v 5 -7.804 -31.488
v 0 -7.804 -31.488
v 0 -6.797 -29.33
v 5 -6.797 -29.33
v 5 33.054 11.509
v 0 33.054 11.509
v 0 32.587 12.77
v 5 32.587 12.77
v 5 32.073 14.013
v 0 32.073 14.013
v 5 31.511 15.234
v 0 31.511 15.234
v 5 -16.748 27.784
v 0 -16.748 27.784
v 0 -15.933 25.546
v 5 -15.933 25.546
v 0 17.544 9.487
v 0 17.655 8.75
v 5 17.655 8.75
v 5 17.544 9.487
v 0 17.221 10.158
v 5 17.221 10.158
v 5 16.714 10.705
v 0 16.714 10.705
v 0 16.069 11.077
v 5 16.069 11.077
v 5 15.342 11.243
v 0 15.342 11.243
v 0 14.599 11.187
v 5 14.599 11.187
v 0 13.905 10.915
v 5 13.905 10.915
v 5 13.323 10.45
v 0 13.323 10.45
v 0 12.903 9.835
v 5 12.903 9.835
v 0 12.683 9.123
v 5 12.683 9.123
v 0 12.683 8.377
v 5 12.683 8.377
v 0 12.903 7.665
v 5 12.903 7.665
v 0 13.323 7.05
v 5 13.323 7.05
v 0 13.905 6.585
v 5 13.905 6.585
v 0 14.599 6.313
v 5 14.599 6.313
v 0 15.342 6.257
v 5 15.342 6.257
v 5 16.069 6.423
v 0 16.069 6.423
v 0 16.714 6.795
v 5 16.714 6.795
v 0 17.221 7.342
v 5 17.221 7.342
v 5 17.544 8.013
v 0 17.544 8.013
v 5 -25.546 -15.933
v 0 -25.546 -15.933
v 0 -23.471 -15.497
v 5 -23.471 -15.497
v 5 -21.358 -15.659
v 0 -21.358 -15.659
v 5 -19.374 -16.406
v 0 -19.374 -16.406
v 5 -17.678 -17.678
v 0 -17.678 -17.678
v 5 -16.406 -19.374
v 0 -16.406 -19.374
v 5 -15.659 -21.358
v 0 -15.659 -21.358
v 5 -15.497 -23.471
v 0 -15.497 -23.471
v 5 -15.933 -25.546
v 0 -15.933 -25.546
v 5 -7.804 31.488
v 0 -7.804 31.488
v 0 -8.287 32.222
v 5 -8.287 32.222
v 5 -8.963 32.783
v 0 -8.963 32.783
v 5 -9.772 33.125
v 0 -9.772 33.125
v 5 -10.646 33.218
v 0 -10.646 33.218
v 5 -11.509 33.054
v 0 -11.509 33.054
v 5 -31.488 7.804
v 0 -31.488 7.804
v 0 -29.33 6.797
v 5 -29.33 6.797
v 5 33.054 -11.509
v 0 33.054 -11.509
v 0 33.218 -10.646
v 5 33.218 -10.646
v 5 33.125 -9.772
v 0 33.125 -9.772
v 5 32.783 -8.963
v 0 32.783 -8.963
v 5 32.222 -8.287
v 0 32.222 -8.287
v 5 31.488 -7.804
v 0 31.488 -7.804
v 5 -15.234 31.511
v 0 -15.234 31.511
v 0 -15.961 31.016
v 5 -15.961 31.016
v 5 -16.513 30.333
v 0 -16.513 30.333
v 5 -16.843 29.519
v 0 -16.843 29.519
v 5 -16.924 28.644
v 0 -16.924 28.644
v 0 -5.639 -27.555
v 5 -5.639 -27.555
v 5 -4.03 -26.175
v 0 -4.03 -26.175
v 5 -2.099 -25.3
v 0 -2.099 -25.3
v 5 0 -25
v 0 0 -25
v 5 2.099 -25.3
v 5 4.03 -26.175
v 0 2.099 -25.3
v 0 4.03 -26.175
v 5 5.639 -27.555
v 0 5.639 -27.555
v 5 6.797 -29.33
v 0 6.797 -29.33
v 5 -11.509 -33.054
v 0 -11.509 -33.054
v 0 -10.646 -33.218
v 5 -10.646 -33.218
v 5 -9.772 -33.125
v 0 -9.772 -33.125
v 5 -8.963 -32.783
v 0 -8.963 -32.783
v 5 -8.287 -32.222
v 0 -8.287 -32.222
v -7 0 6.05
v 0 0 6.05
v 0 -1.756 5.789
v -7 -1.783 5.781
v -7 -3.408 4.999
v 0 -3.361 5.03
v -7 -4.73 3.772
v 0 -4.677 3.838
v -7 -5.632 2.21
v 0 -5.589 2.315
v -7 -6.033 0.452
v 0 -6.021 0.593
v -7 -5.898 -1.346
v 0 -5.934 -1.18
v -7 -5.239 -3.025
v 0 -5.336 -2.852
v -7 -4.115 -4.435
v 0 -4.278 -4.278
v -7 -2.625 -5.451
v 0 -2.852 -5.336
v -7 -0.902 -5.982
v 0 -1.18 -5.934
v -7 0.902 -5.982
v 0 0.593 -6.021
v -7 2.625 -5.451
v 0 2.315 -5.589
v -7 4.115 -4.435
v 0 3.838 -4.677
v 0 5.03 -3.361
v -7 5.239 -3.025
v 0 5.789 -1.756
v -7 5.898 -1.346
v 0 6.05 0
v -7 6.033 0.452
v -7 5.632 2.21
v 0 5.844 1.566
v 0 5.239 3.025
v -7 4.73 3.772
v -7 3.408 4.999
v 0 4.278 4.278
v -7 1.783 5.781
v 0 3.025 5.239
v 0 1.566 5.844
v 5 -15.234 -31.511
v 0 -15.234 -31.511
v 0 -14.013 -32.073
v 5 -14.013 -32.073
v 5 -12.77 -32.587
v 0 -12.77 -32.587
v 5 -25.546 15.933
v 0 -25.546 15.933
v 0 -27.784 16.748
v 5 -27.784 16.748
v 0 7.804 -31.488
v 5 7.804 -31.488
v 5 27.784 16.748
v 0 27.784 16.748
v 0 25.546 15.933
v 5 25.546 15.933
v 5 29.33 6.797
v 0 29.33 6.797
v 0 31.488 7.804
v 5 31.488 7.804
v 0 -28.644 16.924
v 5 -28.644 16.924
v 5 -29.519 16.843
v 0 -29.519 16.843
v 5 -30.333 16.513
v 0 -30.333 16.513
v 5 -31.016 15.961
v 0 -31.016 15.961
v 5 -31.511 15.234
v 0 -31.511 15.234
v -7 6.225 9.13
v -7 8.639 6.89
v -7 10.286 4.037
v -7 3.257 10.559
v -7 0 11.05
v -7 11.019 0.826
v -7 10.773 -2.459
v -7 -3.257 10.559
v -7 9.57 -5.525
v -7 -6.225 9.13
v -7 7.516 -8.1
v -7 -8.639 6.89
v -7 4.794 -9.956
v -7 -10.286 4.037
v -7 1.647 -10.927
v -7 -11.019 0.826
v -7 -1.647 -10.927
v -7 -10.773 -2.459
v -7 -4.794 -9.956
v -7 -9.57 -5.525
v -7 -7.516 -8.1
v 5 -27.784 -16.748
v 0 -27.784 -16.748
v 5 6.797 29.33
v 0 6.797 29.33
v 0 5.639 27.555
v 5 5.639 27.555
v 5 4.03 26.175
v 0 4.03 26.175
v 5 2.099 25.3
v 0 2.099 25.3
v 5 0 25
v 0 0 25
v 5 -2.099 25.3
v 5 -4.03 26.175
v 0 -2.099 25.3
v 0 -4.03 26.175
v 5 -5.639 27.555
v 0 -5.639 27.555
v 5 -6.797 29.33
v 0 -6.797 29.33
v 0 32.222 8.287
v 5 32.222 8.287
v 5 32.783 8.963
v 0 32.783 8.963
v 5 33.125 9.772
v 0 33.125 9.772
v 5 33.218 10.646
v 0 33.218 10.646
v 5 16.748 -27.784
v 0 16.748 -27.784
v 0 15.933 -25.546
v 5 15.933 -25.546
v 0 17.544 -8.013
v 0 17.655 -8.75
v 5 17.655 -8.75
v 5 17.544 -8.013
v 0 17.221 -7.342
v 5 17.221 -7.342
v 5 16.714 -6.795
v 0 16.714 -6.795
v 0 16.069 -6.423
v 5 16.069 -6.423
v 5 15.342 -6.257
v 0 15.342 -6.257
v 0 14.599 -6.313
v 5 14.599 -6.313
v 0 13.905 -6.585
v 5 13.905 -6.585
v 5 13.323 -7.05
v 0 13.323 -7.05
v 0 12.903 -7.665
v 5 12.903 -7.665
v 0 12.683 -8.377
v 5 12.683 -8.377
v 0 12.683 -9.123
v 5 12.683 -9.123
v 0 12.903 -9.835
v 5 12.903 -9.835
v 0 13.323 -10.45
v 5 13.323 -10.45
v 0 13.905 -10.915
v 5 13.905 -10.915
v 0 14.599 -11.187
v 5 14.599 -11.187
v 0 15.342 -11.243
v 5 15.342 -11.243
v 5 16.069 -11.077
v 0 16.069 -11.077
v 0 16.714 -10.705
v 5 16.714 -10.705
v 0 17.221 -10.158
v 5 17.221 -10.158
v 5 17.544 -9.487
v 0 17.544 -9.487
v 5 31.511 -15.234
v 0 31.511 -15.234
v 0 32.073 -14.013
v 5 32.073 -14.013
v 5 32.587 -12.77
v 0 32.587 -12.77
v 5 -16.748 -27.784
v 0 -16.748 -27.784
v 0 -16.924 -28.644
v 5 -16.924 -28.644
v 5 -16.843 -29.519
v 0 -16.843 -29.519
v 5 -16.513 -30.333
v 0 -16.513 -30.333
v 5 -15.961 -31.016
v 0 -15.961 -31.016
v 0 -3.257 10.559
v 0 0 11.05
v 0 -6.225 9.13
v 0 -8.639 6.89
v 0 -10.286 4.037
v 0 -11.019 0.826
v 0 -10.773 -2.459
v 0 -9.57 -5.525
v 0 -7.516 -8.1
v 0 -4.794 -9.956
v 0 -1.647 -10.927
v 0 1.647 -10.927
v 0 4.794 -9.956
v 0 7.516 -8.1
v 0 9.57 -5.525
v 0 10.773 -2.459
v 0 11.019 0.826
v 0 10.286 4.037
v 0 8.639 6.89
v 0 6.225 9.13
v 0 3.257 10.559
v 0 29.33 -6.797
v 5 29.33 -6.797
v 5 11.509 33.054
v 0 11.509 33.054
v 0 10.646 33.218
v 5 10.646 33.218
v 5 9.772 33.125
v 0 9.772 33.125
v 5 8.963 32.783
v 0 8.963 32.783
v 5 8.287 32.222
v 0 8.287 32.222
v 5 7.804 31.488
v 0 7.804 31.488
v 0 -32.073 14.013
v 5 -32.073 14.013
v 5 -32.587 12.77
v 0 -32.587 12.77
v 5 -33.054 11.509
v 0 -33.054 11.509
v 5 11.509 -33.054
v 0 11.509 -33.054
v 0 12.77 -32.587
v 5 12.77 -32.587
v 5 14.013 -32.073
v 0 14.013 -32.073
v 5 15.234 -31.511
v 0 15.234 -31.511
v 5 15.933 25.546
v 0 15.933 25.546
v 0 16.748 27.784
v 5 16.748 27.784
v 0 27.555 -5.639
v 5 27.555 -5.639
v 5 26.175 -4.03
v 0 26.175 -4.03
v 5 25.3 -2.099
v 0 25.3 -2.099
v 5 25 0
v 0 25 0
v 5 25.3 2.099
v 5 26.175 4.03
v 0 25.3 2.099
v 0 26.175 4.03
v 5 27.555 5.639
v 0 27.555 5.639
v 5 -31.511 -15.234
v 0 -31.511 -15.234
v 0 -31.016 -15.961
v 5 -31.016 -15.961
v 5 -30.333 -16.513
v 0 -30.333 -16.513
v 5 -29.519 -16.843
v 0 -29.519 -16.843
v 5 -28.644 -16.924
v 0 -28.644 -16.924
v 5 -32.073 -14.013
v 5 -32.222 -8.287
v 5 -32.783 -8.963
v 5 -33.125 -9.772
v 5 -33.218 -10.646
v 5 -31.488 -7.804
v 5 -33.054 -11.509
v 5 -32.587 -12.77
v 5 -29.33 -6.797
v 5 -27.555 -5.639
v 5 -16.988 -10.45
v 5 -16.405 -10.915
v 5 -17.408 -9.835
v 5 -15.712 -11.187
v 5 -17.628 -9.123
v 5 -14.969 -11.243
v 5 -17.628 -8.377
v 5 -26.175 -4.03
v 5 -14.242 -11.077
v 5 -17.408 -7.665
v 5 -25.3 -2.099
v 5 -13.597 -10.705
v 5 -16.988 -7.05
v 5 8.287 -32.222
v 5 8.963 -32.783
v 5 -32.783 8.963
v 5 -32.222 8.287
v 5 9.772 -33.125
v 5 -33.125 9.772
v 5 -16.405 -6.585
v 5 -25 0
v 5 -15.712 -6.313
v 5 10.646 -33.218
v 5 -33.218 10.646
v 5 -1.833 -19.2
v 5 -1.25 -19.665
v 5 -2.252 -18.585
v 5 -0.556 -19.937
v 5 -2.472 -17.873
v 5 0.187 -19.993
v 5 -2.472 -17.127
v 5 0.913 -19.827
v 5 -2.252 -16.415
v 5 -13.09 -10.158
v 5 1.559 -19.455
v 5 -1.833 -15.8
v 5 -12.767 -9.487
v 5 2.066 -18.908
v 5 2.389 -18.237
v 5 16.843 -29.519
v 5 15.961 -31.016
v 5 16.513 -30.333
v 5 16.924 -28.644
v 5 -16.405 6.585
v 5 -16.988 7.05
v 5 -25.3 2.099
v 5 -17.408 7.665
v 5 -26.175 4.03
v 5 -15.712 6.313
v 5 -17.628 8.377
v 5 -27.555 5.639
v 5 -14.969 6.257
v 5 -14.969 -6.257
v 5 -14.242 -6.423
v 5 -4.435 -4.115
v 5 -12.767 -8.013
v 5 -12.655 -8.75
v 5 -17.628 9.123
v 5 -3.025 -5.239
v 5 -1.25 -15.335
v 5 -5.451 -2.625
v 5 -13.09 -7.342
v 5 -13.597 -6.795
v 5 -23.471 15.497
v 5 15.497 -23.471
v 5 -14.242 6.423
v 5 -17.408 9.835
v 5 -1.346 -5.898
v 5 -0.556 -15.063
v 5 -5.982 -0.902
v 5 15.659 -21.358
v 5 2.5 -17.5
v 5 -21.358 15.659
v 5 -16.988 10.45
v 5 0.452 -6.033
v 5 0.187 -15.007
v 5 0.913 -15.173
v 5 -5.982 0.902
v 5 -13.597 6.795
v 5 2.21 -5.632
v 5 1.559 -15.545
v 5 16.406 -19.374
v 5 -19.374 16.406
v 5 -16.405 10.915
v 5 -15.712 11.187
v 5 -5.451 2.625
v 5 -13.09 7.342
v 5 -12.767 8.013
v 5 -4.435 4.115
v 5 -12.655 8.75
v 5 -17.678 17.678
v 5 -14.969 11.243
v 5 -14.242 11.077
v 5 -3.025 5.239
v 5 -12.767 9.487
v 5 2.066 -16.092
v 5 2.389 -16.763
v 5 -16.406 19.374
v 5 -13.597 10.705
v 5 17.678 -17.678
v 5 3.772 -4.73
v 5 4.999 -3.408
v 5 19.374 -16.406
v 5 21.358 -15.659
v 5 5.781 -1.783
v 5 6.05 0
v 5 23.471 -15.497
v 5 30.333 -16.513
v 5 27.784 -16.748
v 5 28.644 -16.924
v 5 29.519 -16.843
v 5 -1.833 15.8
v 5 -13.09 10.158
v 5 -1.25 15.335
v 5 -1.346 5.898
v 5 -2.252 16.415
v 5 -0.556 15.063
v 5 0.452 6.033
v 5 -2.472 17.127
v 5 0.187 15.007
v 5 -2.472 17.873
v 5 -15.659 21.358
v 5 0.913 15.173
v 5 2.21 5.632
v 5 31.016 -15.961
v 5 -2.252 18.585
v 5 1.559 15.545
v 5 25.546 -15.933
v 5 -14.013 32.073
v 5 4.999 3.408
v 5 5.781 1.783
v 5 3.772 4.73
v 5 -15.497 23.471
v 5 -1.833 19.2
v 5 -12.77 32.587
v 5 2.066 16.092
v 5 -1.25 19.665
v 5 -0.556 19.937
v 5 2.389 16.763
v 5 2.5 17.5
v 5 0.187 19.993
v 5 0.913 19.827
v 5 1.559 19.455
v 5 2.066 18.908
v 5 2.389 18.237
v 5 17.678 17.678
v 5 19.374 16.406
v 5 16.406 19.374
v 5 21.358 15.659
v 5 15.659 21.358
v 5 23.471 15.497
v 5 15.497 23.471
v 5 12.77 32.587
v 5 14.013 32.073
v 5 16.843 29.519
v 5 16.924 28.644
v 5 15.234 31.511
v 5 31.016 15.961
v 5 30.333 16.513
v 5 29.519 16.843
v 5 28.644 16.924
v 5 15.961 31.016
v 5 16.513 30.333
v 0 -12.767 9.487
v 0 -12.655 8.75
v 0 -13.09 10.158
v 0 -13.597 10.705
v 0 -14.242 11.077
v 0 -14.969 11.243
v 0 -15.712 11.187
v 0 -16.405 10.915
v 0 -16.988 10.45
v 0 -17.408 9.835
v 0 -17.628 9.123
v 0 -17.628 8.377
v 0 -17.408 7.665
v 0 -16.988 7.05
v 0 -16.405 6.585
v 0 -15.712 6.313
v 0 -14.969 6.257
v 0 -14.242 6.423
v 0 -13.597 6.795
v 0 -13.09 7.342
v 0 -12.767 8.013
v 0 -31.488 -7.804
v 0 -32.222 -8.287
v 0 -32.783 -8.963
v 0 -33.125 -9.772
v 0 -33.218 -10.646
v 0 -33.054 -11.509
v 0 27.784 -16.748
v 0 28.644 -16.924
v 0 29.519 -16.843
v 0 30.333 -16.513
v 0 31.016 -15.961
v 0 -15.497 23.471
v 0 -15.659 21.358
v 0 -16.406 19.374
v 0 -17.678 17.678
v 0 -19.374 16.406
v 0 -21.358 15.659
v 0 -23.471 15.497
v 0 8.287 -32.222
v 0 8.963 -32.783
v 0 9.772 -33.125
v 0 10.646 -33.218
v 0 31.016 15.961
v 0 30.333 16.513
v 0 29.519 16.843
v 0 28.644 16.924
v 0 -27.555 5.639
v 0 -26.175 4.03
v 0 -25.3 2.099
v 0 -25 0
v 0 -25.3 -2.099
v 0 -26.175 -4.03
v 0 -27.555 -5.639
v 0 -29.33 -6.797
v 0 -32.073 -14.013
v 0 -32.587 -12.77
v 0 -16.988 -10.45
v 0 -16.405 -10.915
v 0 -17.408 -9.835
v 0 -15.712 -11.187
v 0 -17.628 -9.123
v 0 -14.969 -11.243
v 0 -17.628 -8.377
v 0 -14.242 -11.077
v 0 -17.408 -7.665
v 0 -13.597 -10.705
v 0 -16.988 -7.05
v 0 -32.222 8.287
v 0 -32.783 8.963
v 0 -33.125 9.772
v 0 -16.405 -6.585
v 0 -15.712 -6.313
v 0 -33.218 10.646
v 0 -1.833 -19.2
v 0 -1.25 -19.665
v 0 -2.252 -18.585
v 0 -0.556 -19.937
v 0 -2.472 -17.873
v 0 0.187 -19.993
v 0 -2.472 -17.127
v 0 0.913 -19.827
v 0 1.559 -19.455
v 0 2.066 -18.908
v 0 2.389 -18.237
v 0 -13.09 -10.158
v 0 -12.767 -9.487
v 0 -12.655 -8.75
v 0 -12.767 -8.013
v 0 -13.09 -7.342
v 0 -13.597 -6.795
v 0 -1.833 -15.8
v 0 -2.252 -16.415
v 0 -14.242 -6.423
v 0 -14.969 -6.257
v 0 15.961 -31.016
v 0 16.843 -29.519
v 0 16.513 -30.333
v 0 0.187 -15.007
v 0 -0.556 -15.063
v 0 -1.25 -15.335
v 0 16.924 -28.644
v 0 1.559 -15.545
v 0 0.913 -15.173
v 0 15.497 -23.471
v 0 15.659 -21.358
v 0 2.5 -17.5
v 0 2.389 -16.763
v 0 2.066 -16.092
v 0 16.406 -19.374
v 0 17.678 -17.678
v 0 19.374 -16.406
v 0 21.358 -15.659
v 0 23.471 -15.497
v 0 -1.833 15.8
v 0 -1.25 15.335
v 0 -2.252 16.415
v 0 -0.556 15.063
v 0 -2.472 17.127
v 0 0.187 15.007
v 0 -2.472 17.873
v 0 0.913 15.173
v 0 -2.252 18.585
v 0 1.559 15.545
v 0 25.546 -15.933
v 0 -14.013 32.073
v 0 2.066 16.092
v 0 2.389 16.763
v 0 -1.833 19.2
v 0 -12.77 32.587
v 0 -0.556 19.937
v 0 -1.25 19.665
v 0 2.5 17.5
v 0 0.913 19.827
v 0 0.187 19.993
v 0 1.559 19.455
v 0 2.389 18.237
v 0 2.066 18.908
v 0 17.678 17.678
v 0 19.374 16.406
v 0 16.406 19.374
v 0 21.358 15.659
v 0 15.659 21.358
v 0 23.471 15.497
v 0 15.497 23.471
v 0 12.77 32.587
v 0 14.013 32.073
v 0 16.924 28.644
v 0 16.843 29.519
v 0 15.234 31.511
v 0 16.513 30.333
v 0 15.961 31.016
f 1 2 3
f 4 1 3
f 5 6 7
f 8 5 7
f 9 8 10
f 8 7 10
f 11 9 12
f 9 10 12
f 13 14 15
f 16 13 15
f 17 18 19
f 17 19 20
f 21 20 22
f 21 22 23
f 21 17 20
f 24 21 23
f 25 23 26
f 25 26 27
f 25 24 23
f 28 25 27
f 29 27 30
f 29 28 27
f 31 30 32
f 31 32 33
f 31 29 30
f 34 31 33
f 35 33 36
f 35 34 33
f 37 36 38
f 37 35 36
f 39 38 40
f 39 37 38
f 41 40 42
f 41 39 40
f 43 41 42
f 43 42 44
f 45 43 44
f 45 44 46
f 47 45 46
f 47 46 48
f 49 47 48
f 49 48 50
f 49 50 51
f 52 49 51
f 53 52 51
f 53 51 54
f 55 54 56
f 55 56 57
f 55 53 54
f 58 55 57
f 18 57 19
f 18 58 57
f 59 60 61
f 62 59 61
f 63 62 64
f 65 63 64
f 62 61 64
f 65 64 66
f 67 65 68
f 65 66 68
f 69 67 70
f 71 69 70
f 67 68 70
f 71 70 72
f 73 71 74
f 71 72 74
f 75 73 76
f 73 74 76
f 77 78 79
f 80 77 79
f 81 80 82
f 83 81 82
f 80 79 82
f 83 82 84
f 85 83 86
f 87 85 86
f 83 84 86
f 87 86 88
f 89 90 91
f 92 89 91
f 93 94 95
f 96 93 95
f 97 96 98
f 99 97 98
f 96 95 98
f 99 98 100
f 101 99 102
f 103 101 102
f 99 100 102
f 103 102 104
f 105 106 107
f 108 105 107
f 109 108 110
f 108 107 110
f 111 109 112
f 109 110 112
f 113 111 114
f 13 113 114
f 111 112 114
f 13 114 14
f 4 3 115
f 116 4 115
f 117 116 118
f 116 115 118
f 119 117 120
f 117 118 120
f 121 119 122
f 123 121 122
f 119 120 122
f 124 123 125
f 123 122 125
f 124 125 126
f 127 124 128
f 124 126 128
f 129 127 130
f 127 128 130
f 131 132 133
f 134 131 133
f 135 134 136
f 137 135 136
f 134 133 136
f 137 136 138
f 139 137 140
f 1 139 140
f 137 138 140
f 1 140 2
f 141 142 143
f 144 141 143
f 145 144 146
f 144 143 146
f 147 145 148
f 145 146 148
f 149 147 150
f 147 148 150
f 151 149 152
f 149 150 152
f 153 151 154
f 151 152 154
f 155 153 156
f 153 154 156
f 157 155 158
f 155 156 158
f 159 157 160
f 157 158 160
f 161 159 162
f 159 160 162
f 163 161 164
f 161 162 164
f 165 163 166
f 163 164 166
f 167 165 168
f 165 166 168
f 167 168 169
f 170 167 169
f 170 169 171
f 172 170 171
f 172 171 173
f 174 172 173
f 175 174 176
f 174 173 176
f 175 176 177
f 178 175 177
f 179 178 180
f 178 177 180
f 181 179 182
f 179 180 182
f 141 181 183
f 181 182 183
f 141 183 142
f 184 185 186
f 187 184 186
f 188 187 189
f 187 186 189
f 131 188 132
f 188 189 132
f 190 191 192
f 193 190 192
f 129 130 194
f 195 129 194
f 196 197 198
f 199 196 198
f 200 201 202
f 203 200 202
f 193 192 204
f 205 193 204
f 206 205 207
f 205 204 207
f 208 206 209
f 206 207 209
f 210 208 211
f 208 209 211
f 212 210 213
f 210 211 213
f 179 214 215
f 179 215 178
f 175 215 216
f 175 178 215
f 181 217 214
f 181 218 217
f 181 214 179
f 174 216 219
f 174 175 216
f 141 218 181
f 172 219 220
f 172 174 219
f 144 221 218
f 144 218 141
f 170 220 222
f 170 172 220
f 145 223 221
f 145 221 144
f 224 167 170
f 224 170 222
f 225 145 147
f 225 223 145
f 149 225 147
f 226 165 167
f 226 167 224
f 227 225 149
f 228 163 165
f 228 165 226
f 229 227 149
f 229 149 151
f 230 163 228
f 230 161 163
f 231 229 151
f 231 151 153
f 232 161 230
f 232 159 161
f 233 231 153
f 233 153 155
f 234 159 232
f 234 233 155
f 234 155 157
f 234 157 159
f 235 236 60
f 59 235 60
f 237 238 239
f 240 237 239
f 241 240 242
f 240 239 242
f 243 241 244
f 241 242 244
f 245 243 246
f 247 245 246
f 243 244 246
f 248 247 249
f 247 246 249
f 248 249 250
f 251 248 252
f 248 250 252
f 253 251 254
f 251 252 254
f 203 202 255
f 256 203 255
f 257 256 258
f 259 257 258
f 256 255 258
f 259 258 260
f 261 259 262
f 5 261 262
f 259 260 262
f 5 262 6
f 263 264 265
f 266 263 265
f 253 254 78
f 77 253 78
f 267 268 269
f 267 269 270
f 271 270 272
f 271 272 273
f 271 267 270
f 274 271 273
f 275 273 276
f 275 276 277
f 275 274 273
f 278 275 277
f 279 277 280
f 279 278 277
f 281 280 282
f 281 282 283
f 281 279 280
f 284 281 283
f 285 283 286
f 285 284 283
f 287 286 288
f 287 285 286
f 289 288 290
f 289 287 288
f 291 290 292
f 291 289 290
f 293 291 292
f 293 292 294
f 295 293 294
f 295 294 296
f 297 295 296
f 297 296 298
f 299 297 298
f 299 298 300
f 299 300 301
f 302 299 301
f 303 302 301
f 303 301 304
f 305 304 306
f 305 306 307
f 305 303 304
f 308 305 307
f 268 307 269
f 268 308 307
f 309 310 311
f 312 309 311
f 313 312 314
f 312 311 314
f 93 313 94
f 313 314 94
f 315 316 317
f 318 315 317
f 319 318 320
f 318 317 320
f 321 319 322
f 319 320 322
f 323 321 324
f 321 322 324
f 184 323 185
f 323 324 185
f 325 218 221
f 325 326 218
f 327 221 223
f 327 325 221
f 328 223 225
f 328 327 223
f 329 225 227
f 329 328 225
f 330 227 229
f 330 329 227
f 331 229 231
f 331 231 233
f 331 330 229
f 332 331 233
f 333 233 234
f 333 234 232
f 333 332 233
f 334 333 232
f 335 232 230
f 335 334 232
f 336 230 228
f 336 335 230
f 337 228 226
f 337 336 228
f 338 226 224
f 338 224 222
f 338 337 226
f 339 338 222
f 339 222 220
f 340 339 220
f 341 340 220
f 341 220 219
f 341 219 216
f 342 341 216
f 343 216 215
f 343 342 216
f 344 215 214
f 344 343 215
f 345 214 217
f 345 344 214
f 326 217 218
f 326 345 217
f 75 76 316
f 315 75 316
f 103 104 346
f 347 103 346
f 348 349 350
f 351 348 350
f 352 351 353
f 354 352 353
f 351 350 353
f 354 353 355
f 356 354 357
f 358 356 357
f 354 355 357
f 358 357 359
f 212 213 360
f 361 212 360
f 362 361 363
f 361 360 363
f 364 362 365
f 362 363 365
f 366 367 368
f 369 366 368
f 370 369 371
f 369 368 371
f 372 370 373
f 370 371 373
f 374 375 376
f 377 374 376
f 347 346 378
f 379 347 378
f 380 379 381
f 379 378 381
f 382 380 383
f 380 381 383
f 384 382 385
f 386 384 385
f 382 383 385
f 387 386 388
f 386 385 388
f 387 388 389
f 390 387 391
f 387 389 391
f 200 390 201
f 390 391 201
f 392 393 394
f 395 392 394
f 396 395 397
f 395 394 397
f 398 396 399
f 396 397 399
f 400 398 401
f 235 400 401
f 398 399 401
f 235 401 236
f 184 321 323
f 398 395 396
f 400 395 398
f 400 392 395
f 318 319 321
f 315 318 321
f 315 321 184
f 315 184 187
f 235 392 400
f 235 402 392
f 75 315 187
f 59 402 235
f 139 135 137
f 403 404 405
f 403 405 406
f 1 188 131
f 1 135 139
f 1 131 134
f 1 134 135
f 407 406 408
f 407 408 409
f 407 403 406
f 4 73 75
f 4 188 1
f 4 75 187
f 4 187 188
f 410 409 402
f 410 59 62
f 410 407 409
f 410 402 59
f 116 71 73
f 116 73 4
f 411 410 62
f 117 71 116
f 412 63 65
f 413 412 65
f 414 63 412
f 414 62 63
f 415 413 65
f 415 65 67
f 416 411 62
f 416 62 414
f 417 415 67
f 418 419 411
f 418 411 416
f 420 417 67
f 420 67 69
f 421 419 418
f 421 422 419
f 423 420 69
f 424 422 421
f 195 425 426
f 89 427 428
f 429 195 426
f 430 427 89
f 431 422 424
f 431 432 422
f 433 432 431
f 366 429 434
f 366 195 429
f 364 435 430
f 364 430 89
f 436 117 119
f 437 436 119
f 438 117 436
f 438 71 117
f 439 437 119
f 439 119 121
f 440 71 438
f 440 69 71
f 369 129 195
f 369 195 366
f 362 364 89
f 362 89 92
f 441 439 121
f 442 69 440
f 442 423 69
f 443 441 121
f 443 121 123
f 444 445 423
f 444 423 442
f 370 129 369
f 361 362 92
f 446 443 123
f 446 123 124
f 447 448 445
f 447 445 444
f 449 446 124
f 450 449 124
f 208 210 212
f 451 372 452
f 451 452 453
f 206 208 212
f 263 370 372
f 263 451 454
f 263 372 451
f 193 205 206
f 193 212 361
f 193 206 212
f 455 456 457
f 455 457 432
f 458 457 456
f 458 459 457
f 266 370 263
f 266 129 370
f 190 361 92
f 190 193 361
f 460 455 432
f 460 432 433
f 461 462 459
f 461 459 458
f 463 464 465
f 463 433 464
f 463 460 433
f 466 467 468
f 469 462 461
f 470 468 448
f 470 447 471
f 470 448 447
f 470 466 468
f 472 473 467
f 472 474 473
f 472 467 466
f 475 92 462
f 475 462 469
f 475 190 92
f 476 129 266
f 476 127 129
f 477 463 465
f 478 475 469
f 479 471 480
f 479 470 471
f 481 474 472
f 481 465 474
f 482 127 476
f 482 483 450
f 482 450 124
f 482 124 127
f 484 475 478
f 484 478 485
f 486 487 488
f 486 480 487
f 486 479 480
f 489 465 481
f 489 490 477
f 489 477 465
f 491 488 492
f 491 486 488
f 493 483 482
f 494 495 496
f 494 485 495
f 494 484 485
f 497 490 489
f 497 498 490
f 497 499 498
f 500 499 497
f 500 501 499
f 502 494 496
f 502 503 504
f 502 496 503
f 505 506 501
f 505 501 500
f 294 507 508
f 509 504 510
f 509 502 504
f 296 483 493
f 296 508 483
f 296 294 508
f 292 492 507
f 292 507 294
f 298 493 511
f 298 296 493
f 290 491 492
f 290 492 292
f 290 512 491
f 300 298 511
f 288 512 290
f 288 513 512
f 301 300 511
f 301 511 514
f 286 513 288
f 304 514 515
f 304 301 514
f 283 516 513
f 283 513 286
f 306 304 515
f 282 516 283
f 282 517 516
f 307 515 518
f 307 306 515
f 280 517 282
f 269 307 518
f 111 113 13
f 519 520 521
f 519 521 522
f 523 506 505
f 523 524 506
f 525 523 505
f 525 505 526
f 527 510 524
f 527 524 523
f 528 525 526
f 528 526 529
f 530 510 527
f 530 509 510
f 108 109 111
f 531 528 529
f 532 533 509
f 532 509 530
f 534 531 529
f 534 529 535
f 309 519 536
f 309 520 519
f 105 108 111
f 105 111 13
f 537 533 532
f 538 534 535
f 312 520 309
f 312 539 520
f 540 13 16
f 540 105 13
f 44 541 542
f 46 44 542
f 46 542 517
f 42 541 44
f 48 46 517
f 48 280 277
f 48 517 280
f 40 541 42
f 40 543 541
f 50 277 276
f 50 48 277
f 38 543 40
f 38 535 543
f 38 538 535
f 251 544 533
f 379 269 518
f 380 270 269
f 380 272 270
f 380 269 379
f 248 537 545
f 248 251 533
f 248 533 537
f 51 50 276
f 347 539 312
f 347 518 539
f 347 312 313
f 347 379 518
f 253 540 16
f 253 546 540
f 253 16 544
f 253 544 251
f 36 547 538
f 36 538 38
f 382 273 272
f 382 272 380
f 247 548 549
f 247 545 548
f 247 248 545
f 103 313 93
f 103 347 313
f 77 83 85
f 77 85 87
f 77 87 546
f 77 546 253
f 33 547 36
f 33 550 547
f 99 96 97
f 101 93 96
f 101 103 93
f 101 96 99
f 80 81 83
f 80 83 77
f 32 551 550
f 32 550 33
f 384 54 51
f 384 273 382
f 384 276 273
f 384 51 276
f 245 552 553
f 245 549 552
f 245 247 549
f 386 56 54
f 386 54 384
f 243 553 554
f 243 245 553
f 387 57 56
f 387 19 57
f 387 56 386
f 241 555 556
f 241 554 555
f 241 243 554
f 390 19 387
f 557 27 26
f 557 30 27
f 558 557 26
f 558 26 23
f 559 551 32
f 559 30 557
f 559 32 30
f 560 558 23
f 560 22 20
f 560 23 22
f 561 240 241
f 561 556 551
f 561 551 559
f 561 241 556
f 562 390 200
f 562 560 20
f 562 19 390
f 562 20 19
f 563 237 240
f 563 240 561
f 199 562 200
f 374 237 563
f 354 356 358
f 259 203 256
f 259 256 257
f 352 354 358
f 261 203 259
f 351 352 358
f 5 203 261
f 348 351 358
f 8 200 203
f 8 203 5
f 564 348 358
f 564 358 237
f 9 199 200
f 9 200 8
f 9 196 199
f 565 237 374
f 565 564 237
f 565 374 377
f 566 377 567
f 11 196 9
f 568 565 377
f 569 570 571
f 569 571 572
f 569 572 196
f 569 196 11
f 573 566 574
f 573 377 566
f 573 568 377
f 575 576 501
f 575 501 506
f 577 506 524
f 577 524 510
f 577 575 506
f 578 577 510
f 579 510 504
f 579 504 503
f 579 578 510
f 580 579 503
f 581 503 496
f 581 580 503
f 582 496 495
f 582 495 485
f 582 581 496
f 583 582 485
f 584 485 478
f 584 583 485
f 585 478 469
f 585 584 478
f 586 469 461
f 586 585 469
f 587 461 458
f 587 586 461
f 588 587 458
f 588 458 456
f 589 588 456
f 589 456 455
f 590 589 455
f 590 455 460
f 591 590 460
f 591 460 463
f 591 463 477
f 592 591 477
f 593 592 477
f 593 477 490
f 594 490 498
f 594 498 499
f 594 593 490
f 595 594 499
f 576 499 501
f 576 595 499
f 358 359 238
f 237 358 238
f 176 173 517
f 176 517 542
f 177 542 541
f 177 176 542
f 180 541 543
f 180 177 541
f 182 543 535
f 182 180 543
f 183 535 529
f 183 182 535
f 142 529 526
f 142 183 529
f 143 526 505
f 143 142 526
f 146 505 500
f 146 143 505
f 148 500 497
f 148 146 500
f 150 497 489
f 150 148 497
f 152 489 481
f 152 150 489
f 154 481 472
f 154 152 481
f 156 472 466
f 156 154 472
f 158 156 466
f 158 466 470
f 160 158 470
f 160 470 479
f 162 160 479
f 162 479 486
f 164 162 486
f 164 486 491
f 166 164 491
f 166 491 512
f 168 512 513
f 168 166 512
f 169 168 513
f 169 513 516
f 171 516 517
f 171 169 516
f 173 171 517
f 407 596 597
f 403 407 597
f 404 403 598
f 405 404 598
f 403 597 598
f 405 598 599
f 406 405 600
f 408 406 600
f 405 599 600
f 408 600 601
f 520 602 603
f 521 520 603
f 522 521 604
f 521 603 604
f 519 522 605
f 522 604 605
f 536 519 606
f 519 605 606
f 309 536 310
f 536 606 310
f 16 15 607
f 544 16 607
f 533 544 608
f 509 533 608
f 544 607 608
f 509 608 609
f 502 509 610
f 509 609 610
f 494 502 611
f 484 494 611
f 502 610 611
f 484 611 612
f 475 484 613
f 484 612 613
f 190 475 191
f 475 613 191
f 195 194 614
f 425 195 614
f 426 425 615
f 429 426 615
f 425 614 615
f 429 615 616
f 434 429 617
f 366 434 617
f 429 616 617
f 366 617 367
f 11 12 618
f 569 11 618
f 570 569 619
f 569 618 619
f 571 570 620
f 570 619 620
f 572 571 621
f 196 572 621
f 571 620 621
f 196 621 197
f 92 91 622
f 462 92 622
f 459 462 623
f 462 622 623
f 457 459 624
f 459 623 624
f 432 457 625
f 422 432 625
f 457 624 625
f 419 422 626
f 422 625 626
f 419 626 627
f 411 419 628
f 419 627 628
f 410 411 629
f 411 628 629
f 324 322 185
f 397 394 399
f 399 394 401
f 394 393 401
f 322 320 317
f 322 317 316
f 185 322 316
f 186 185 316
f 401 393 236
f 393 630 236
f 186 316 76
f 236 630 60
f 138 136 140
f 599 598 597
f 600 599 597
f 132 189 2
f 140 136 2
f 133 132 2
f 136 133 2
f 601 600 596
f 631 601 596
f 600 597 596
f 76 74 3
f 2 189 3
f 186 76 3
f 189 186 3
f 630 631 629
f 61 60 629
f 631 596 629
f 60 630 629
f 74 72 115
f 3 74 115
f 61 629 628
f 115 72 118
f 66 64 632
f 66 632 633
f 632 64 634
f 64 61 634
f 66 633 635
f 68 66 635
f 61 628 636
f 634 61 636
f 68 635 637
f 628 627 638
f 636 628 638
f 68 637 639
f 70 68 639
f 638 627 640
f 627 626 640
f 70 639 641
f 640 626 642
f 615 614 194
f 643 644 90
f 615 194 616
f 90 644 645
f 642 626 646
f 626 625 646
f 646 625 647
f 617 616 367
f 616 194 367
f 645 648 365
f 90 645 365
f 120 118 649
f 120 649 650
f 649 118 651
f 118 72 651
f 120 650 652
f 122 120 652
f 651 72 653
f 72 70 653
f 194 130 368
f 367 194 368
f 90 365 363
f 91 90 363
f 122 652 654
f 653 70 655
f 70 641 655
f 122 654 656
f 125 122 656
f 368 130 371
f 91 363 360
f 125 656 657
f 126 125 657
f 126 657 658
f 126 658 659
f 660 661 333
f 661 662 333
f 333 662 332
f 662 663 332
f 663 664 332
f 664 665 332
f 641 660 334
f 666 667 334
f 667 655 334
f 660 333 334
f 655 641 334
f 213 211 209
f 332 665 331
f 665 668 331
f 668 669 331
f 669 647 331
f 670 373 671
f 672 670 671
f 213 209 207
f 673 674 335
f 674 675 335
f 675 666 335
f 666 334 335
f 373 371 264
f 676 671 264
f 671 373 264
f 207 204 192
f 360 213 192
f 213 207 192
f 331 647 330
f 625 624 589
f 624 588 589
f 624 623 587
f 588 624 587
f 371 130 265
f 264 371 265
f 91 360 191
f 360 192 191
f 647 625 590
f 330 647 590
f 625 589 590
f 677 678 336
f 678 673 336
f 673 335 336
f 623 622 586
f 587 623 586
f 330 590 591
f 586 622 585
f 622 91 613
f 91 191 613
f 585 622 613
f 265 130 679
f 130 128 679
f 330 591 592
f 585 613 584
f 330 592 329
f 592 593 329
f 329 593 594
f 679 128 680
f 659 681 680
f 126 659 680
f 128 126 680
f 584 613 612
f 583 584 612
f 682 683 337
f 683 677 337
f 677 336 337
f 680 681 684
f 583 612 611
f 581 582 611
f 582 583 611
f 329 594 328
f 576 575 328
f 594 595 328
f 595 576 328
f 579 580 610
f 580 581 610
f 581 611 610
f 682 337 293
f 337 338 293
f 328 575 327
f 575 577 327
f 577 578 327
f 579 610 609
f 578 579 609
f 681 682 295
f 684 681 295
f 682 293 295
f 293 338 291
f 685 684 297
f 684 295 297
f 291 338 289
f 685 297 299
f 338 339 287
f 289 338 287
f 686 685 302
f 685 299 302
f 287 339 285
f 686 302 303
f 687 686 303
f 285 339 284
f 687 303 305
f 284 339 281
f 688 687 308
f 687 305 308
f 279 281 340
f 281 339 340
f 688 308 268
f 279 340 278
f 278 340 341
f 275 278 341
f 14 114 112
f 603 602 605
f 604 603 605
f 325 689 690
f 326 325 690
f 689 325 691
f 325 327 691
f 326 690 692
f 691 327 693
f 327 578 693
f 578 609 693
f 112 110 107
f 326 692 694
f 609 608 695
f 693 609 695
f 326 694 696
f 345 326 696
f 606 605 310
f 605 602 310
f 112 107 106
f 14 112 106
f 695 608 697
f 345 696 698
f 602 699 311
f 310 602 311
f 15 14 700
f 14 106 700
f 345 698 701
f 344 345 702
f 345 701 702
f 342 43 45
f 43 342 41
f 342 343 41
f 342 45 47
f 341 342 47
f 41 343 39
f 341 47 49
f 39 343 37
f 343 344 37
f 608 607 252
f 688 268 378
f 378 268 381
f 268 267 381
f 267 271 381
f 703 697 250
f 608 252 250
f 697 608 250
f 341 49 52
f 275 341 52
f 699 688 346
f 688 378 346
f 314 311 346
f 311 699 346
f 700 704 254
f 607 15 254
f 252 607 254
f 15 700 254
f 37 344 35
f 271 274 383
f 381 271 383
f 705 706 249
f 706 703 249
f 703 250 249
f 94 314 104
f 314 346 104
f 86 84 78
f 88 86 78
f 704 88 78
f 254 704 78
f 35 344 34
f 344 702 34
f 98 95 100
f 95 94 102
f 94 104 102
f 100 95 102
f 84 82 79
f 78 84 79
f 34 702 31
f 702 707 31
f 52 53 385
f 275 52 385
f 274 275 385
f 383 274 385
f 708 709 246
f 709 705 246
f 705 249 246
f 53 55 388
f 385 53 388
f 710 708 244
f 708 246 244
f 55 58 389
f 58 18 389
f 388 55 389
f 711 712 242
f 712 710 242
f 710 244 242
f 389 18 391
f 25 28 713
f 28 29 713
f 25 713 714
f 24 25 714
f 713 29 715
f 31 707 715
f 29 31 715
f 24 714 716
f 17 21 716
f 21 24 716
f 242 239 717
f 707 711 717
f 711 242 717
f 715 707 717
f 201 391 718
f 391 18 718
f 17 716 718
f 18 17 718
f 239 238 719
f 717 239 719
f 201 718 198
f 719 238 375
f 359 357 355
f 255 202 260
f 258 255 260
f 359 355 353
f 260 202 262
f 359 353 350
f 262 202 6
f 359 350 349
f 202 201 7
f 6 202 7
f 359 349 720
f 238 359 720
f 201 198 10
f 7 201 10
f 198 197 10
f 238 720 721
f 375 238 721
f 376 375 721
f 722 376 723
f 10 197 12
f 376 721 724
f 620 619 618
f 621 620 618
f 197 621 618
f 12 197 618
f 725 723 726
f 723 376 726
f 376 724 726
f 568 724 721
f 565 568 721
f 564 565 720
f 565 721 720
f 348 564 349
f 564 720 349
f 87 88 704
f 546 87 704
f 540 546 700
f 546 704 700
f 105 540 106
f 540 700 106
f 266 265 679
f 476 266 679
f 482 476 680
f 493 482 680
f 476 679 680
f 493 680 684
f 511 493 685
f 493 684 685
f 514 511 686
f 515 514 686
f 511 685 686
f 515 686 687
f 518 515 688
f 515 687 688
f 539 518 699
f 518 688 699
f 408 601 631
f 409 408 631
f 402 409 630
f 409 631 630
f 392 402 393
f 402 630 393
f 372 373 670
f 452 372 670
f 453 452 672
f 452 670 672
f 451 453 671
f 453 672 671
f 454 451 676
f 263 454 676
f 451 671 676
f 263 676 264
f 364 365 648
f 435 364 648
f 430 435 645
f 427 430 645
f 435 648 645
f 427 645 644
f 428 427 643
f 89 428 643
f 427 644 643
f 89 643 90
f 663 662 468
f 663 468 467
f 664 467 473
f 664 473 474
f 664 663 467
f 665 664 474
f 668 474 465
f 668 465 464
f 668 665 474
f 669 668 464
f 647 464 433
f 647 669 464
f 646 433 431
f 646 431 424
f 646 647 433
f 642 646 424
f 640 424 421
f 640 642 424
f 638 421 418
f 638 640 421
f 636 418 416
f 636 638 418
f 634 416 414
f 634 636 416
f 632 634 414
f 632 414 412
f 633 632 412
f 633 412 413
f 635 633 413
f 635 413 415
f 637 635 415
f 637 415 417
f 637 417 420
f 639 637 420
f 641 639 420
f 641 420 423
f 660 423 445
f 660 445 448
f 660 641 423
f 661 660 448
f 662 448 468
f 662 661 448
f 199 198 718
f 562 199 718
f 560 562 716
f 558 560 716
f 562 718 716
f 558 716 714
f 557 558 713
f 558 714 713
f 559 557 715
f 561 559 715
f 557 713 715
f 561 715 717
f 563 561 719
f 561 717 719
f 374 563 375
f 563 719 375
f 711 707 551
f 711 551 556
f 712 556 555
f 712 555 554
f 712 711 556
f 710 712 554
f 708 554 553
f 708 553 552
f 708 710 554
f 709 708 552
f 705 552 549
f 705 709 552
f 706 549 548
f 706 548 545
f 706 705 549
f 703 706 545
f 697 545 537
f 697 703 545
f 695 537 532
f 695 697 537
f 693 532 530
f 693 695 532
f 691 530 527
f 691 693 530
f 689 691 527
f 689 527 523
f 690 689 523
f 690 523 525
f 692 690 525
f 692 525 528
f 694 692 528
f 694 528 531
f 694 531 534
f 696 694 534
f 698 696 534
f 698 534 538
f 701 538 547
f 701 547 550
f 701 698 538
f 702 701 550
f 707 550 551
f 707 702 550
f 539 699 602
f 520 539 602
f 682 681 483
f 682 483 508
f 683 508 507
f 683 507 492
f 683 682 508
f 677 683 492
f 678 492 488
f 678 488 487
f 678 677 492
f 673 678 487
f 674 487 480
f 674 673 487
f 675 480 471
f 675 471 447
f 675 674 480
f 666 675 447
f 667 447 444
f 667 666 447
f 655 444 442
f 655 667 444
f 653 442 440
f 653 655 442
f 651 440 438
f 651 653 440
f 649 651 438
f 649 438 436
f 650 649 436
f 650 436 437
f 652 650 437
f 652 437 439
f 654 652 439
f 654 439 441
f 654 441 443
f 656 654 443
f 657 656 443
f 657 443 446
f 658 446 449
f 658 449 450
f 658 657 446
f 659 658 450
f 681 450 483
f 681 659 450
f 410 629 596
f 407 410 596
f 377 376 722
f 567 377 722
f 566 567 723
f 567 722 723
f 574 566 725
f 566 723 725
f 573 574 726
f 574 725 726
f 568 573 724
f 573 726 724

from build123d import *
from build123d import SkipClean  # not in build123d's __all__

# Parameters (mm, degrees)
F0_R     = 2.5
F0_R_2   = 6.05
F1_DEPTH = 5
F2_W     = 7
F2_H     = 5


with BuildPart() as f1:
    # F0 (on Right) → F1 (new body)
    with BuildSketch(Plane.YZ):
        with BuildLine():
            ThreePointArc((6.7973084028, 29.3303630369), (0, 25), (-6.7973084028, 29.3303630369))
            Line((-6.7973084028, 29.3303630369), (-7.8035829138, 31.4883256898))
            ThreePointArc((-7.8035829138, 31.4883256898), (-9.3550783484, 32.9840034331), (-11.5089912382, 33.0536400519))
            ThreePointArc((-11.5089912382, 33.0536400519), (-13.3939201328, 32.3357836379), (-15.2343672744, 31.5105387727))
            ThreePointArc((-15.2343672744, 31.5105387727), (-16.7081731596, 29.9382518369), (-16.7476422276, 27.7835750194))
            Line((-16.7476422276, 27.7835750194), (-15.9332757327, 25.5461214635))
            ThreePointArc((-15.9332757327, 25.5461214635), (-17.6776695297, 17.6776695297), (-25.5461214635, 15.9332757327))
            Line((-25.5461214635, 15.9332757327), (-27.7835750194, 16.7476422276))
            ThreePointArc((-27.7835750194, 16.7476422276), (-29.9382518369, 16.7081731596), (-31.5105387727, 15.2343672744))
            ThreePointArc((-31.5105387727, 15.2343672744), (-32.3357836379, 13.3939201328), (-33.0536400519, 11.5089912382))
            ThreePointArc((-33.0536400519, 11.5089912382), (-32.9840034331, 9.3550783484), (-31.4883256898, 7.8035829138))
            Line((-31.4883256898, 7.8035829138), (-29.3303630369, 6.7973084028))
            ThreePointArc((-29.3303630369, 6.7973084028), (-25, 0), (-29.3303630369, -6.7973084028))
            Line((-29.3303630369, -6.7973084028), (-31.4883256898, -7.8035829138))
            ThreePointArc((-31.4883256898, -7.8035829138), (-32.9840034331, -9.3550783484), (-33.0536400519, -11.5089912382))
            ThreePointArc((-33.0536400519, -11.5089912382), (-32.3357836379, -13.3939201328), (-31.5105387727, -15.2343672744))
            ThreePointArc((-31.5105387727, -15.2343672744), (-29.9382518369, -16.7081731596), (-27.7835750194, -16.7476422276))
            Line((-27.7835750194, -16.7476422276), (-25.5461214635, -15.9332757327))
            ThreePointArc((-25.5461214635, -15.9332757327), (-17.6776695297, -17.6776695297), (-15.9332757327, -25.5461214635))
            Line((-15.9332757327, -25.5461214635), (-16.7476422276, -27.7835750194))
            ThreePointArc((-16.7476422276, -27.7835750194), (-16.7081731596, -29.9382518369), (-15.2343672744, -31.5105387727))
            ThreePointArc((-15.2343672744, -31.5105387727), (-13.3939201328, -32.3357836379), (-11.5089912382, -33.0536400519))
            ThreePointArc((-11.5089912382, -33.0536400519), (-9.3550783484, -32.9840034331), (-7.8035829138, -31.4883256898))
            Line((-7.8035829138, -31.4883256898), (-6.7973084028, -29.3303630369))
            ThreePointArc((-6.7973084028, -29.3303630369), (0, -25), (6.7973084028, -29.3303630369))
            Line((6.7973084028, -29.3303630369), (7.8035829138, -31.4883256898))
            ThreePointArc((7.8035829138, -31.4883256898), (9.3550783484, -32.9840034331), (11.5089912382, -33.0536400519))
            ThreePointArc((11.5089912382, -33.0536400519), (13.3939201328, -32.3357836379), (15.2343672744, -31.5105387727))
            ThreePointArc((15.2343672744, -31.5105387727), (16.7081731596, -29.9382518369), (16.7476422276, -27.7835750194))
            Line((16.7476422276, -27.7835750194), (15.9332757327, -25.5461214635))
            ThreePointArc((15.9332757327, -25.5461214635), (17.6776695297, -17.6776695297), (25.5461214635, -15.9332757327))
            Line((25.5461214635, -15.9332757327), (27.7835750194, -16.7476422276))
            ThreePointArc((27.7835750194, -16.7476422276), (29.9382518369, -16.7081731596), (31.5105387727, -15.2343672744))
            ThreePointArc((31.5105387727, -15.2343672744), (32.3357836379, -13.3939201328), (33.0536400519, -11.5089912382))
            ThreePointArc((33.0536400519, -11.5089912382), (32.9840034331, -9.3550783484), (31.4883256898, -7.8035829138))
            Line((31.4883256898, -7.8035829138), (29.3303630369, -6.7973084028))
            ThreePointArc((29.3303630369, -6.7973084028), (25, 0), (29.3303630369, 6.7973084028))
            Line((29.3303630369, 6.7973084028), (31.4883256898, 7.8035829138))
            ThreePointArc((31.4883256898, 7.8035829138), (32.9840034331, 9.3550783484), (33.0536400519, 11.5089912382))
            ThreePointArc((33.0536400519, 11.5089912382), (32.3357836379, 13.3939201328), (31.5105387727, 15.2343672744))
            ThreePointArc((31.5105387727, 15.2343672744), (29.9382518369, 16.7081731596), (27.7835750194, 16.7476422276))
            Line((27.7835750194, 16.7476422276), (25.5461214635, 15.9332757327))
            ThreePointArc((25.5461214635, 15.9332757327), (17.6776695297, 17.6776695297), (15.9332757327, 25.5461214635))
            Line((15.9332757327, 25.5461214635), (16.7476422276, 27.7835750194))
            ThreePointArc((16.7476422276, 27.7835750194), (16.7081731596, 29.9382518369), (15.2343672744, 31.5105387727))
            ThreePointArc((15.2343672744, 31.5105387727), (13.3939201328, 32.3357836379), (11.5089912382, 33.0536400519))
            ThreePointArc((11.5089912382, 33.0536400519), (9.3550783484, 32.9840034331), (7.8035829138, 31.4883256898))
            Line((7.8035829138, 31.4883256898), (6.7973084028, 29.3303630369))
        make_face()
        with Locations((-15.1554445662, -8.75)):
            Circle(F0_R, mode=Mode.SUBTRACT)
        with Locations((0, -17.5)):
            Circle(F0_R, mode=Mode.SUBTRACT)
        with Locations((15.1554445662, -8.75)):
            Circle(F0_R, mode=Mode.SUBTRACT)
        with Locations((-15.1554445662, 8.75)):
            Circle(F0_R, mode=Mode.SUBTRACT)
        Circle(F0_R_2, mode=Mode.SUBTRACT)
        with Locations((15.1554445662, 8.75)):
            Circle(F0_R, mode=Mode.SUBTRACT)
        with Locations((0, 17.5)):
            Circle(F0_R, mode=Mode.SUBTRACT)
    extrude(amount=F1_DEPTH)

    # F2 (on Front) → F3 (revolve)
    with BuildSketch(Plane.XZ):
        with Locations((-3.5, 8.55)):
            Rectangle(F2_W, F2_H)
    with SkipClean():  # cleaning this boolean's faces spoils the solid; the shape is the same uncleaned
        revolve(axis=Axis((9.7608398646, 0, 0), (1, 0, 0)))


solid = f1.part
